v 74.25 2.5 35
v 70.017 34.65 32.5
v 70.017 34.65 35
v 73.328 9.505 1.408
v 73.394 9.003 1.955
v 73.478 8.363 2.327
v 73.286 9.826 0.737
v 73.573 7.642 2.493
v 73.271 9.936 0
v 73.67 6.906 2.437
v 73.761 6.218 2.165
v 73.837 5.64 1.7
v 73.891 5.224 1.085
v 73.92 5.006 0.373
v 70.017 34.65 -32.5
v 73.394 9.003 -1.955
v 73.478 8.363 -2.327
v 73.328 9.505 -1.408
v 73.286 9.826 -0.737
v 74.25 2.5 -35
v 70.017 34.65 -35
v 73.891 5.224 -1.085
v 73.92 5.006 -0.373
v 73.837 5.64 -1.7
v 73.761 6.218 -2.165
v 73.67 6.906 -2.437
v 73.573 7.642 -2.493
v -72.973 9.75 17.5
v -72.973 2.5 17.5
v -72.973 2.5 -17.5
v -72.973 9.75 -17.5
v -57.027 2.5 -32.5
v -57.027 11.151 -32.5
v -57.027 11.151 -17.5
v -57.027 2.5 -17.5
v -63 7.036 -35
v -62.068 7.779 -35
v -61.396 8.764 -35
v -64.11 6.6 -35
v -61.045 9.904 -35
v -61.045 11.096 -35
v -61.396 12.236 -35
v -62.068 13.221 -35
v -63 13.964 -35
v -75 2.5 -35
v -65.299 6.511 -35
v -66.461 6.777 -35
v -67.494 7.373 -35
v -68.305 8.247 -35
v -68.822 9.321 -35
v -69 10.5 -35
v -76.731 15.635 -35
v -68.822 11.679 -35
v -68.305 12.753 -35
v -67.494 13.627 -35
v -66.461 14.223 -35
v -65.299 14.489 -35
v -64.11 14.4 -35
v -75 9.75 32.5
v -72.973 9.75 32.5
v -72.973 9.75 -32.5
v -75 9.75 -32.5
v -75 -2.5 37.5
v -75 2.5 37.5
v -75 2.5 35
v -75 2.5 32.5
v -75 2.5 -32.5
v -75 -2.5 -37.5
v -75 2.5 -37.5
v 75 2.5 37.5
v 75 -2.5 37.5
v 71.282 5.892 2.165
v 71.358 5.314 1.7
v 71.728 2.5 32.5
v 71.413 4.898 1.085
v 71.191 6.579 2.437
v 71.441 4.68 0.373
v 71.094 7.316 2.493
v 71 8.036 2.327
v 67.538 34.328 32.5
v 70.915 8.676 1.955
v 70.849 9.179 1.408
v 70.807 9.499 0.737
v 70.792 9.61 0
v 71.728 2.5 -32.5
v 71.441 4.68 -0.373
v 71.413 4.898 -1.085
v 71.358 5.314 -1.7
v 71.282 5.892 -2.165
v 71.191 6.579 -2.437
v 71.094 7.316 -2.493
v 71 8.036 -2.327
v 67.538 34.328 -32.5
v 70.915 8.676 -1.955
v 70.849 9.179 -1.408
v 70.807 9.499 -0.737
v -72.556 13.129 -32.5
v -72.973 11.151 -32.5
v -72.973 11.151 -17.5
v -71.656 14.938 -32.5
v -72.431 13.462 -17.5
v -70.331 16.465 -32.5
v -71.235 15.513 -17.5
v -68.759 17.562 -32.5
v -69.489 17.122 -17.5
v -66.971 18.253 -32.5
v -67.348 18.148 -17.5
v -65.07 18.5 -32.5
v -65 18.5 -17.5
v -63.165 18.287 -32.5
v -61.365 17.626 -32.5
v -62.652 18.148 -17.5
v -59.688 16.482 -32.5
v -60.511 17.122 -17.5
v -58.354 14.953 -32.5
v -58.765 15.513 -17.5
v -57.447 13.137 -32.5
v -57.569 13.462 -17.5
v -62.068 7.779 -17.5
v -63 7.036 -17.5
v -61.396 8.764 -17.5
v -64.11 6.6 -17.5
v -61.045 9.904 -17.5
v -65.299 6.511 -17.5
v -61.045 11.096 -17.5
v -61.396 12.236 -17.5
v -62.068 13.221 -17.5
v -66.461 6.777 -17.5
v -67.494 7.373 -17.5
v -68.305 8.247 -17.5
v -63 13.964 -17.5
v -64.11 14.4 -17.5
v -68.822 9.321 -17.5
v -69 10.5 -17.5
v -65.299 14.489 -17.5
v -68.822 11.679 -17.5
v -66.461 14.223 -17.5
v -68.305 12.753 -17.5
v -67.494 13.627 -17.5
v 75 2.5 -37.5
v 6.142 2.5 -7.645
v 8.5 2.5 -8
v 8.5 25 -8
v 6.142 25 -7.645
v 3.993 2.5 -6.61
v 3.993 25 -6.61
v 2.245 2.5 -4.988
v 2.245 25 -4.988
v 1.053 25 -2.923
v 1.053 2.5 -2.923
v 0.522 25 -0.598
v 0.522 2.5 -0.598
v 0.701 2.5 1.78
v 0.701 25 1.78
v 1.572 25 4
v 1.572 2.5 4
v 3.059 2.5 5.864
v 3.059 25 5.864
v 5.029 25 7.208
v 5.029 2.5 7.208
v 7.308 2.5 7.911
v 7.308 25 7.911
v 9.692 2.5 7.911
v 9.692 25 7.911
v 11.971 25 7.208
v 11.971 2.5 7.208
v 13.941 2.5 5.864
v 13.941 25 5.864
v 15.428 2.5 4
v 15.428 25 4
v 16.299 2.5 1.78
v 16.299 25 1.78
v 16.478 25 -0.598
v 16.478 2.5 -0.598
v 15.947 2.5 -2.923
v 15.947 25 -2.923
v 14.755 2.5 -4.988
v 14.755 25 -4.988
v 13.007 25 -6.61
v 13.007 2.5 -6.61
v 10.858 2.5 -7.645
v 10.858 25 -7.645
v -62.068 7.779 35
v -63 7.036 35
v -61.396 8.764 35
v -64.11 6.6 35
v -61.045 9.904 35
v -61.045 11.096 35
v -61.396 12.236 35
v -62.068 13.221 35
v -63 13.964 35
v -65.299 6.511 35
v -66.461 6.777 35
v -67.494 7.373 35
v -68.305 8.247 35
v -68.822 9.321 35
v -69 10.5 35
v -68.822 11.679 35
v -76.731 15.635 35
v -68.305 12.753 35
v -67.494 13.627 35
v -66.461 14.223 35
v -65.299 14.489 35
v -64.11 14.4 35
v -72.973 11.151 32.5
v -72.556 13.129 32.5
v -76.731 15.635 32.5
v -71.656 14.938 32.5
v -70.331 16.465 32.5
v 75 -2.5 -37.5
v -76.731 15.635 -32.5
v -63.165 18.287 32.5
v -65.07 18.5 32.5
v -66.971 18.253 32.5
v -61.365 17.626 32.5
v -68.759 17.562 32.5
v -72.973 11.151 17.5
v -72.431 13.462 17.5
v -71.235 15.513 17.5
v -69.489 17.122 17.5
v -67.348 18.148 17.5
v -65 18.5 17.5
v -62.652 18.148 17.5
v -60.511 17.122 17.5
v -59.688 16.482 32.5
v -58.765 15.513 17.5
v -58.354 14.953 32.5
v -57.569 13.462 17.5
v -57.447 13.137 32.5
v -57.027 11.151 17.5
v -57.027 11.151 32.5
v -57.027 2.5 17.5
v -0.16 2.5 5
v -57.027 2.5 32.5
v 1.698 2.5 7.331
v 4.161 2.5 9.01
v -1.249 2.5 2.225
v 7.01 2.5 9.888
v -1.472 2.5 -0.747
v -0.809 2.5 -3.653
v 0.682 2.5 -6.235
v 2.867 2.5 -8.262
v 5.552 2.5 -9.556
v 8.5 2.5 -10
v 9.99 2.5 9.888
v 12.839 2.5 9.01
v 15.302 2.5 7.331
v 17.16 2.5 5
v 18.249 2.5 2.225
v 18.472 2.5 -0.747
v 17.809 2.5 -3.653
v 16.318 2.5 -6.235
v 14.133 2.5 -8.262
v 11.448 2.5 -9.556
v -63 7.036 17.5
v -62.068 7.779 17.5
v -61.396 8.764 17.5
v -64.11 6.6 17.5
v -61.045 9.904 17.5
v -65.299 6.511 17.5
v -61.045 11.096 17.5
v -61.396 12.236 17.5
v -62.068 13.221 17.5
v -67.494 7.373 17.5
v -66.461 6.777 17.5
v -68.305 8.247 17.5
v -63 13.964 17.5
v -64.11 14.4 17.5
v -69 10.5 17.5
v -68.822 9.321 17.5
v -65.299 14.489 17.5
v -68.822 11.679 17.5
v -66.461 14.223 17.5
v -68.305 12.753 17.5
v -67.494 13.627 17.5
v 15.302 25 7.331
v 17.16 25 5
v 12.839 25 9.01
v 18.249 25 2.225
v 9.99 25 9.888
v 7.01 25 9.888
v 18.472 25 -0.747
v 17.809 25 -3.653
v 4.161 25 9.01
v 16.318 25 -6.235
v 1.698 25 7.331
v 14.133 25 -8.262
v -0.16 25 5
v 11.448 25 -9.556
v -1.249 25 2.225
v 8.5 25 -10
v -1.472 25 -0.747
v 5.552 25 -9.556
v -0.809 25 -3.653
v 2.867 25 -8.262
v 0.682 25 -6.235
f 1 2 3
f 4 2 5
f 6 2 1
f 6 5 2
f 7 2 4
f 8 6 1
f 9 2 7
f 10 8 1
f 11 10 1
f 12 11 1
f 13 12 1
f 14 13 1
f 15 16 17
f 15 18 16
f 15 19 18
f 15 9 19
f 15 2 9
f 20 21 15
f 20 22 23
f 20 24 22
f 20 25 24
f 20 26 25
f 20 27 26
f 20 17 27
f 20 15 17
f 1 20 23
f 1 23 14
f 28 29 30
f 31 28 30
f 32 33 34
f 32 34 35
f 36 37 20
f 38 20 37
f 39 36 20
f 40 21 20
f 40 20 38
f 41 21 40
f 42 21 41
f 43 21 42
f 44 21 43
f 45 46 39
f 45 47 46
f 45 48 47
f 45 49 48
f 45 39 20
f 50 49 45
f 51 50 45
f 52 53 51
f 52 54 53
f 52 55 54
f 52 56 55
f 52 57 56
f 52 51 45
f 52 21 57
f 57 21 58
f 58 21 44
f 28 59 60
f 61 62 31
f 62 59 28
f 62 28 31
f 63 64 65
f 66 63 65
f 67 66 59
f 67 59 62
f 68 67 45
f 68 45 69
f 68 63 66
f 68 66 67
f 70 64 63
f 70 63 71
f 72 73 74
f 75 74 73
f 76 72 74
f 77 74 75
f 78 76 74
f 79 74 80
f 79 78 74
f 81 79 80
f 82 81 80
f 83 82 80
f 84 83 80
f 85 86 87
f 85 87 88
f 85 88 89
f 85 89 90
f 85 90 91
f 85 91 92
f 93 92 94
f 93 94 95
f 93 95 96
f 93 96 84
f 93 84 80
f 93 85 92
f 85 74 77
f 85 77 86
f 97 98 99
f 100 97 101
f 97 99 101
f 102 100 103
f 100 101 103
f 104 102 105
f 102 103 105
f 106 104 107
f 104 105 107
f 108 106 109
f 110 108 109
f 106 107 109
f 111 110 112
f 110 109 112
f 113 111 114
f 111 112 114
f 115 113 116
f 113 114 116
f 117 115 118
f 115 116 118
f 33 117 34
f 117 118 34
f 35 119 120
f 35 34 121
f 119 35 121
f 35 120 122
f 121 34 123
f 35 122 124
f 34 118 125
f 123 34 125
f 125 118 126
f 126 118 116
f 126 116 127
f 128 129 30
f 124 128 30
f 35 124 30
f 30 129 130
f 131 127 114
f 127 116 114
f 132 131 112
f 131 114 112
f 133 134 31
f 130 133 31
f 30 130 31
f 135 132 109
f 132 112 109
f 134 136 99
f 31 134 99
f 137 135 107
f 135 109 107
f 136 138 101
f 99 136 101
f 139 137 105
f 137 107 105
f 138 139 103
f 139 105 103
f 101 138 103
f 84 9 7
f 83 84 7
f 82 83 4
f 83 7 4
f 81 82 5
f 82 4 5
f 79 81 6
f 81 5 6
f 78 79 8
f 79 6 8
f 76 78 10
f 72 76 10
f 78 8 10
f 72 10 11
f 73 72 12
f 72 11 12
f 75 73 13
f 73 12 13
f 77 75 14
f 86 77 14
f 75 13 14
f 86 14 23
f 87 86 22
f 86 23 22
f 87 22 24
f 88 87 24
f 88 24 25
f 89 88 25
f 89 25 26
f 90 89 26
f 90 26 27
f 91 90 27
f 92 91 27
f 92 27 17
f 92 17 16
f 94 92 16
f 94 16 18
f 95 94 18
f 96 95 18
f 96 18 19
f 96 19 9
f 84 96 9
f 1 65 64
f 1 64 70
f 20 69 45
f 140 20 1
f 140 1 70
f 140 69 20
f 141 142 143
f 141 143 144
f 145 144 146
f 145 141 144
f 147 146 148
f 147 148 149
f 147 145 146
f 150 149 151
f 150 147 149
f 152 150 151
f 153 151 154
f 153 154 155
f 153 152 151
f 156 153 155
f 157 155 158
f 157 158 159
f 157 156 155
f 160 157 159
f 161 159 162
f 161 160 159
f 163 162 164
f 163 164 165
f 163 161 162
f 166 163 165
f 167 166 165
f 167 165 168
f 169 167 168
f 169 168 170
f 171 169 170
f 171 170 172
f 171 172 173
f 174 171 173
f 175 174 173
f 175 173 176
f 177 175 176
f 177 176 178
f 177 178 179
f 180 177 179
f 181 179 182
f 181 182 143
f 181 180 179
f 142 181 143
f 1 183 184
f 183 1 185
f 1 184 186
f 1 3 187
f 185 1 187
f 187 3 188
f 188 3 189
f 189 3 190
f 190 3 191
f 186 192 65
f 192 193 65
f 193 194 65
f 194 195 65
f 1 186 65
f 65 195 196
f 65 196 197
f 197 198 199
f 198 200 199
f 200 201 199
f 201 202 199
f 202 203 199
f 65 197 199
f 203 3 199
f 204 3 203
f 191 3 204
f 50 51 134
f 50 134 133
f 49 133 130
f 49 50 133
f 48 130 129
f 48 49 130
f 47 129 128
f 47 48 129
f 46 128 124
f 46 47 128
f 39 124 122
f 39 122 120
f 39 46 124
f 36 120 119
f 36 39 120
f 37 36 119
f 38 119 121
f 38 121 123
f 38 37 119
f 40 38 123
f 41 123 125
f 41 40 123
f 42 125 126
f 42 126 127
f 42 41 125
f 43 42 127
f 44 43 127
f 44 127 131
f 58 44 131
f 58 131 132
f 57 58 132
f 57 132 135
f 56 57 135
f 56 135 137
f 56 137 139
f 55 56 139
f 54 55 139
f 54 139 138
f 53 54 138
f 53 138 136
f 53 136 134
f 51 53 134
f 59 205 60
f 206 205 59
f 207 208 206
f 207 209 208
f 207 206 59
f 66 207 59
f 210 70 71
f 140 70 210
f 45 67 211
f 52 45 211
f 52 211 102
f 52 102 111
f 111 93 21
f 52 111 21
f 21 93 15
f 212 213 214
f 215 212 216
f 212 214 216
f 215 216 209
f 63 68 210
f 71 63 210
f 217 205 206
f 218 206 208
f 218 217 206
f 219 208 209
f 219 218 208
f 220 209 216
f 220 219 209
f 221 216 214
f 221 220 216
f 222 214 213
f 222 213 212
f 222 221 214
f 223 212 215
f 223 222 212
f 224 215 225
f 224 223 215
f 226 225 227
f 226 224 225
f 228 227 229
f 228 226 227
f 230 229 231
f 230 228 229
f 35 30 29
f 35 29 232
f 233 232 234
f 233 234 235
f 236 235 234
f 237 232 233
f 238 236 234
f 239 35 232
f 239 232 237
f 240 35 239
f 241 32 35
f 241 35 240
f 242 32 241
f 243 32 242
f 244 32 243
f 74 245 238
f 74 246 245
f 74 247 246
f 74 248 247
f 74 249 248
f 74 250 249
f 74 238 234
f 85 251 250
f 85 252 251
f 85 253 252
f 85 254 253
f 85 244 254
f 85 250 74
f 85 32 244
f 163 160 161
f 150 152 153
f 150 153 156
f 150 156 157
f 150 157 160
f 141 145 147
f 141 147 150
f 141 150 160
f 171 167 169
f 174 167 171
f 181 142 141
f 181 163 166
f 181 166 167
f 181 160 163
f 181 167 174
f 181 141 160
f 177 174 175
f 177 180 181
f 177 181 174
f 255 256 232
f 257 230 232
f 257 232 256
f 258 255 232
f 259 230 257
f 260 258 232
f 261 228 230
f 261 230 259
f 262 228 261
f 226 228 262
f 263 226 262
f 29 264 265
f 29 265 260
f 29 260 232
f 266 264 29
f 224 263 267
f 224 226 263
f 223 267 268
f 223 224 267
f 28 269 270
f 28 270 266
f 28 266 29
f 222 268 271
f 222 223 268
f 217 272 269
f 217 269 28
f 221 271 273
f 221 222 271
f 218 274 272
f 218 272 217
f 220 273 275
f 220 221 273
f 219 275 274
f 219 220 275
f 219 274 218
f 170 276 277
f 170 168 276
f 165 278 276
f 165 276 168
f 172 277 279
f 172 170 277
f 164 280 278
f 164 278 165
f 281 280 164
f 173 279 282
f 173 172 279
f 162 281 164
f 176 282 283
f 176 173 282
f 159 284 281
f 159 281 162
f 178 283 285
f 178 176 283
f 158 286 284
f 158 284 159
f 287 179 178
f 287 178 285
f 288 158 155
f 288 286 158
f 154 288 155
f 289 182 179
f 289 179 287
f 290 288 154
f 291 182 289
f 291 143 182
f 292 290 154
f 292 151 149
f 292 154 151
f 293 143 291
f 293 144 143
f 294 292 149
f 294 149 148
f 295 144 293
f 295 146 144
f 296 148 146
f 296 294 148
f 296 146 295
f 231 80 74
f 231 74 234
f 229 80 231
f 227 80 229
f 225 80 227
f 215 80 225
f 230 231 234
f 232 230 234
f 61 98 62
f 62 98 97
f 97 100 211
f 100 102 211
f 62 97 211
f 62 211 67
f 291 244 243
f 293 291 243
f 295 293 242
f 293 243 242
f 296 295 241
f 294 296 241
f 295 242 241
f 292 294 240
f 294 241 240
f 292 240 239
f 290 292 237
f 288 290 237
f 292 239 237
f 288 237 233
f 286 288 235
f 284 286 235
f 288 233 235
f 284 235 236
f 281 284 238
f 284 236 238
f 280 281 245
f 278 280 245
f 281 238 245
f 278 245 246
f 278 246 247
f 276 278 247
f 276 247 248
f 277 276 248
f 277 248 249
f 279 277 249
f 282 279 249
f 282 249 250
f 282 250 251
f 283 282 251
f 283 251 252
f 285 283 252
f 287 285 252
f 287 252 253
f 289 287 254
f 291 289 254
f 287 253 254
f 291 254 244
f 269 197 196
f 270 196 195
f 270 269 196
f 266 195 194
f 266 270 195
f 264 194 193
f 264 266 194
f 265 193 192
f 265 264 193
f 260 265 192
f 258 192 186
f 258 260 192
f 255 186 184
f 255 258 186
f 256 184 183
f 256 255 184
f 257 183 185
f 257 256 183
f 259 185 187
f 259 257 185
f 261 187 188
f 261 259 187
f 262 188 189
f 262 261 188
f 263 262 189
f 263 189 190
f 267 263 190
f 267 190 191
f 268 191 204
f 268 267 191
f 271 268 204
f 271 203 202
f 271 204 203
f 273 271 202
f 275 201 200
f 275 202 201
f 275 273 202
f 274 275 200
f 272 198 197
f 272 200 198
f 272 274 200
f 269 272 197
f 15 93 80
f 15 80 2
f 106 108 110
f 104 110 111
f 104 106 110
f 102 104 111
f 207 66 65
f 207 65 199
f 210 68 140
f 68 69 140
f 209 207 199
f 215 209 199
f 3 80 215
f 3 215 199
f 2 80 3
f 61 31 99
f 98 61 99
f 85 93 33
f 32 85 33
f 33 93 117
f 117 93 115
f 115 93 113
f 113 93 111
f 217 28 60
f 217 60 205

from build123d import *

# Parameters (mm, degrees)
SKETCH1_W               = 150
SKETCH1_H               = 75
BOSS_EXTRUDE1_DEPTH     = 2.5
BOSS_EXTRUDE5_START     = 32.5
BOSS_EXTRUDE5_DEPTH     = 2.5
BOSS_EXTRUDE2_START     = 17.5
SKETCH3_R               = 4
BOSS_EXTRUDE2_DEPTH     = 15
SKETCH2_R               = 10
SKETCH2_R_2             = 8
BOSS_EXTRUDE3_DEPTH     = 22.5
SKETCH5_W               = 2.026540741
SKETCH5_H               = 65
BOSS_EXTRUDE4_DEPTH     = 7.25
BOSS_EXTRUDE6_DEPTH     = 65
CUT_EXTRUDE1_DEPTH      = 112.106096906
CUT_EXTRUDE1_DEPTH_BACK = 112.106096906
SKETCH9_R               = 4
SKETCH13_R              = 2.5
CUT_EXTRUDE4_DEPTH      = 5


with BuildPart() as part:
    # Sketch1 → Boss-Extrude1 (new, symmetric)
    with BuildSketch(Plane(origin=(0, 0, 0), x_dir=(1, 0, 0), z_dir=(0, 1, 0))):
        Rectangle(SKETCH1_W, SKETCH1_H)
    extrude(amount=BOSS_EXTRUDE1_DEPTH, both=True)

    # Sketch7 → Boss-Extrude5 (add)
    with BuildSketch(Plane.XY.offset(BOSS_EXTRUDE5_START)):
        Polygon((70.01742626, 34.649589392), (74.25, 2.5), (-75, 2.5), (-76.731484571, 15.635393826), align=None)
    boss_extrude5 = extrude(amount=BOSS_EXTRUDE5_DEPTH)

    # Sketch3 → Boss-Extrude2 (add)
    with BuildSketch(Plane.XY.offset(BOSS_EXTRUDE2_START)):
        with BuildLine():
            Line((-72.973459259, 2.5), (-72.973459259, 11.15111247))
            ThreePointArc((-72.973459259, 11.15111247), (-65, 18.5), (-57.026540741, 11.15111247))
            Line((-57.026540741, 11.15111247), (-57.026540741, 2.5))
            Line((-57.026540741, 2.5), (-72.973459259, 2.5))
        make_face()
        with Locations(Location((-65, 10.5, 0), (0, 0, 180))):
            Circle(SKETCH3_R, mode=Mode.SUBTRACT)
    boss_extrude2 = extrude(amount=BOSS_EXTRUDE2_DEPTH)

    # Mirror1: Boss-Extrude5, Boss-Extrude2 across plane
    add(boss_extrude5.mirror(Plane.XY))
    add(boss_extrude2.mirror(Plane.XY))

    # Sketch2 → Boss-Extrude3 (add)
    with BuildSketch(Plane(origin=(0, 2.5, 0), x_dir=(1, 0, 0), z_dir=(0, 1, 0))):
        with Locations(Location((8.5, 0, 0), (0, 0, 90))):
            Circle(SKETCH2_R)
        with Locations(Location((8.5, 0, 0), (0, 0, 90))):
            Circle(SKETCH2_R_2, mode=Mode.SUBTRACT)
    extrude(amount=BOSS_EXTRUDE3_DEPTH)

    # Sketch5 → Boss-Extrude4 (add)
    with BuildSketch(Plane(origin=(0, 2.5, 0), x_dir=(1, 0, 0), z_dir=(0, 1, 0))):
        with Locations((-73.98672963, 0)):
            Rectangle(SKETCH5_W, SKETCH5_H)
    extrude(amount=BOSS_EXTRUDE4_DEPTH)

    # Sketch8 → Boss-Extrude6 (add)
    with BuildSketch(Plane.XY.offset(-32.5)):
        Polygon((70.01742626, 34.649589392), (74.25, 2.5), (71.728427599, 2.5), (67.53814582, 34.328350053), align=None)
    extrude(amount=BOSS_EXTRUDE6_DEPTH)

    # Sketch9 → Cut-Extrude1 (cut, two sides: drawn at the far end of the back side and taken through both)
    with BuildSketch(Plane.XY.offset(35).offset(-CUT_EXTRUDE1_DEPTH_BACK)):
        with Locations(Location((-65, 10.5, 0), (0, 0, 180))):
            Circle(SKETCH9_R)
    extrude(amount=CUT_EXTRUDE1_DEPTH + CUT_EXTRUDE1_DEPTH_BACK, mode=Mode.SUBTRACT)

    # Sketch13 → Cut-Extrude4 (cut)
    with BuildSketch(Plane(origin=(73.308520107, 9.651249767, 0), x_dir=(0, 0, -1), z_dir=(0.9914448613738098, 0.13052619222005604, 0))):
        with Locations(Location((0, -2.212957619, 0), (0, 0, 90))):
            Circle(SKETCH13_R)
    extrude(amount=-CUT_EXTRUDE4_DEPTH, mode=Mode.SUBTRACT)


solid = part.part
